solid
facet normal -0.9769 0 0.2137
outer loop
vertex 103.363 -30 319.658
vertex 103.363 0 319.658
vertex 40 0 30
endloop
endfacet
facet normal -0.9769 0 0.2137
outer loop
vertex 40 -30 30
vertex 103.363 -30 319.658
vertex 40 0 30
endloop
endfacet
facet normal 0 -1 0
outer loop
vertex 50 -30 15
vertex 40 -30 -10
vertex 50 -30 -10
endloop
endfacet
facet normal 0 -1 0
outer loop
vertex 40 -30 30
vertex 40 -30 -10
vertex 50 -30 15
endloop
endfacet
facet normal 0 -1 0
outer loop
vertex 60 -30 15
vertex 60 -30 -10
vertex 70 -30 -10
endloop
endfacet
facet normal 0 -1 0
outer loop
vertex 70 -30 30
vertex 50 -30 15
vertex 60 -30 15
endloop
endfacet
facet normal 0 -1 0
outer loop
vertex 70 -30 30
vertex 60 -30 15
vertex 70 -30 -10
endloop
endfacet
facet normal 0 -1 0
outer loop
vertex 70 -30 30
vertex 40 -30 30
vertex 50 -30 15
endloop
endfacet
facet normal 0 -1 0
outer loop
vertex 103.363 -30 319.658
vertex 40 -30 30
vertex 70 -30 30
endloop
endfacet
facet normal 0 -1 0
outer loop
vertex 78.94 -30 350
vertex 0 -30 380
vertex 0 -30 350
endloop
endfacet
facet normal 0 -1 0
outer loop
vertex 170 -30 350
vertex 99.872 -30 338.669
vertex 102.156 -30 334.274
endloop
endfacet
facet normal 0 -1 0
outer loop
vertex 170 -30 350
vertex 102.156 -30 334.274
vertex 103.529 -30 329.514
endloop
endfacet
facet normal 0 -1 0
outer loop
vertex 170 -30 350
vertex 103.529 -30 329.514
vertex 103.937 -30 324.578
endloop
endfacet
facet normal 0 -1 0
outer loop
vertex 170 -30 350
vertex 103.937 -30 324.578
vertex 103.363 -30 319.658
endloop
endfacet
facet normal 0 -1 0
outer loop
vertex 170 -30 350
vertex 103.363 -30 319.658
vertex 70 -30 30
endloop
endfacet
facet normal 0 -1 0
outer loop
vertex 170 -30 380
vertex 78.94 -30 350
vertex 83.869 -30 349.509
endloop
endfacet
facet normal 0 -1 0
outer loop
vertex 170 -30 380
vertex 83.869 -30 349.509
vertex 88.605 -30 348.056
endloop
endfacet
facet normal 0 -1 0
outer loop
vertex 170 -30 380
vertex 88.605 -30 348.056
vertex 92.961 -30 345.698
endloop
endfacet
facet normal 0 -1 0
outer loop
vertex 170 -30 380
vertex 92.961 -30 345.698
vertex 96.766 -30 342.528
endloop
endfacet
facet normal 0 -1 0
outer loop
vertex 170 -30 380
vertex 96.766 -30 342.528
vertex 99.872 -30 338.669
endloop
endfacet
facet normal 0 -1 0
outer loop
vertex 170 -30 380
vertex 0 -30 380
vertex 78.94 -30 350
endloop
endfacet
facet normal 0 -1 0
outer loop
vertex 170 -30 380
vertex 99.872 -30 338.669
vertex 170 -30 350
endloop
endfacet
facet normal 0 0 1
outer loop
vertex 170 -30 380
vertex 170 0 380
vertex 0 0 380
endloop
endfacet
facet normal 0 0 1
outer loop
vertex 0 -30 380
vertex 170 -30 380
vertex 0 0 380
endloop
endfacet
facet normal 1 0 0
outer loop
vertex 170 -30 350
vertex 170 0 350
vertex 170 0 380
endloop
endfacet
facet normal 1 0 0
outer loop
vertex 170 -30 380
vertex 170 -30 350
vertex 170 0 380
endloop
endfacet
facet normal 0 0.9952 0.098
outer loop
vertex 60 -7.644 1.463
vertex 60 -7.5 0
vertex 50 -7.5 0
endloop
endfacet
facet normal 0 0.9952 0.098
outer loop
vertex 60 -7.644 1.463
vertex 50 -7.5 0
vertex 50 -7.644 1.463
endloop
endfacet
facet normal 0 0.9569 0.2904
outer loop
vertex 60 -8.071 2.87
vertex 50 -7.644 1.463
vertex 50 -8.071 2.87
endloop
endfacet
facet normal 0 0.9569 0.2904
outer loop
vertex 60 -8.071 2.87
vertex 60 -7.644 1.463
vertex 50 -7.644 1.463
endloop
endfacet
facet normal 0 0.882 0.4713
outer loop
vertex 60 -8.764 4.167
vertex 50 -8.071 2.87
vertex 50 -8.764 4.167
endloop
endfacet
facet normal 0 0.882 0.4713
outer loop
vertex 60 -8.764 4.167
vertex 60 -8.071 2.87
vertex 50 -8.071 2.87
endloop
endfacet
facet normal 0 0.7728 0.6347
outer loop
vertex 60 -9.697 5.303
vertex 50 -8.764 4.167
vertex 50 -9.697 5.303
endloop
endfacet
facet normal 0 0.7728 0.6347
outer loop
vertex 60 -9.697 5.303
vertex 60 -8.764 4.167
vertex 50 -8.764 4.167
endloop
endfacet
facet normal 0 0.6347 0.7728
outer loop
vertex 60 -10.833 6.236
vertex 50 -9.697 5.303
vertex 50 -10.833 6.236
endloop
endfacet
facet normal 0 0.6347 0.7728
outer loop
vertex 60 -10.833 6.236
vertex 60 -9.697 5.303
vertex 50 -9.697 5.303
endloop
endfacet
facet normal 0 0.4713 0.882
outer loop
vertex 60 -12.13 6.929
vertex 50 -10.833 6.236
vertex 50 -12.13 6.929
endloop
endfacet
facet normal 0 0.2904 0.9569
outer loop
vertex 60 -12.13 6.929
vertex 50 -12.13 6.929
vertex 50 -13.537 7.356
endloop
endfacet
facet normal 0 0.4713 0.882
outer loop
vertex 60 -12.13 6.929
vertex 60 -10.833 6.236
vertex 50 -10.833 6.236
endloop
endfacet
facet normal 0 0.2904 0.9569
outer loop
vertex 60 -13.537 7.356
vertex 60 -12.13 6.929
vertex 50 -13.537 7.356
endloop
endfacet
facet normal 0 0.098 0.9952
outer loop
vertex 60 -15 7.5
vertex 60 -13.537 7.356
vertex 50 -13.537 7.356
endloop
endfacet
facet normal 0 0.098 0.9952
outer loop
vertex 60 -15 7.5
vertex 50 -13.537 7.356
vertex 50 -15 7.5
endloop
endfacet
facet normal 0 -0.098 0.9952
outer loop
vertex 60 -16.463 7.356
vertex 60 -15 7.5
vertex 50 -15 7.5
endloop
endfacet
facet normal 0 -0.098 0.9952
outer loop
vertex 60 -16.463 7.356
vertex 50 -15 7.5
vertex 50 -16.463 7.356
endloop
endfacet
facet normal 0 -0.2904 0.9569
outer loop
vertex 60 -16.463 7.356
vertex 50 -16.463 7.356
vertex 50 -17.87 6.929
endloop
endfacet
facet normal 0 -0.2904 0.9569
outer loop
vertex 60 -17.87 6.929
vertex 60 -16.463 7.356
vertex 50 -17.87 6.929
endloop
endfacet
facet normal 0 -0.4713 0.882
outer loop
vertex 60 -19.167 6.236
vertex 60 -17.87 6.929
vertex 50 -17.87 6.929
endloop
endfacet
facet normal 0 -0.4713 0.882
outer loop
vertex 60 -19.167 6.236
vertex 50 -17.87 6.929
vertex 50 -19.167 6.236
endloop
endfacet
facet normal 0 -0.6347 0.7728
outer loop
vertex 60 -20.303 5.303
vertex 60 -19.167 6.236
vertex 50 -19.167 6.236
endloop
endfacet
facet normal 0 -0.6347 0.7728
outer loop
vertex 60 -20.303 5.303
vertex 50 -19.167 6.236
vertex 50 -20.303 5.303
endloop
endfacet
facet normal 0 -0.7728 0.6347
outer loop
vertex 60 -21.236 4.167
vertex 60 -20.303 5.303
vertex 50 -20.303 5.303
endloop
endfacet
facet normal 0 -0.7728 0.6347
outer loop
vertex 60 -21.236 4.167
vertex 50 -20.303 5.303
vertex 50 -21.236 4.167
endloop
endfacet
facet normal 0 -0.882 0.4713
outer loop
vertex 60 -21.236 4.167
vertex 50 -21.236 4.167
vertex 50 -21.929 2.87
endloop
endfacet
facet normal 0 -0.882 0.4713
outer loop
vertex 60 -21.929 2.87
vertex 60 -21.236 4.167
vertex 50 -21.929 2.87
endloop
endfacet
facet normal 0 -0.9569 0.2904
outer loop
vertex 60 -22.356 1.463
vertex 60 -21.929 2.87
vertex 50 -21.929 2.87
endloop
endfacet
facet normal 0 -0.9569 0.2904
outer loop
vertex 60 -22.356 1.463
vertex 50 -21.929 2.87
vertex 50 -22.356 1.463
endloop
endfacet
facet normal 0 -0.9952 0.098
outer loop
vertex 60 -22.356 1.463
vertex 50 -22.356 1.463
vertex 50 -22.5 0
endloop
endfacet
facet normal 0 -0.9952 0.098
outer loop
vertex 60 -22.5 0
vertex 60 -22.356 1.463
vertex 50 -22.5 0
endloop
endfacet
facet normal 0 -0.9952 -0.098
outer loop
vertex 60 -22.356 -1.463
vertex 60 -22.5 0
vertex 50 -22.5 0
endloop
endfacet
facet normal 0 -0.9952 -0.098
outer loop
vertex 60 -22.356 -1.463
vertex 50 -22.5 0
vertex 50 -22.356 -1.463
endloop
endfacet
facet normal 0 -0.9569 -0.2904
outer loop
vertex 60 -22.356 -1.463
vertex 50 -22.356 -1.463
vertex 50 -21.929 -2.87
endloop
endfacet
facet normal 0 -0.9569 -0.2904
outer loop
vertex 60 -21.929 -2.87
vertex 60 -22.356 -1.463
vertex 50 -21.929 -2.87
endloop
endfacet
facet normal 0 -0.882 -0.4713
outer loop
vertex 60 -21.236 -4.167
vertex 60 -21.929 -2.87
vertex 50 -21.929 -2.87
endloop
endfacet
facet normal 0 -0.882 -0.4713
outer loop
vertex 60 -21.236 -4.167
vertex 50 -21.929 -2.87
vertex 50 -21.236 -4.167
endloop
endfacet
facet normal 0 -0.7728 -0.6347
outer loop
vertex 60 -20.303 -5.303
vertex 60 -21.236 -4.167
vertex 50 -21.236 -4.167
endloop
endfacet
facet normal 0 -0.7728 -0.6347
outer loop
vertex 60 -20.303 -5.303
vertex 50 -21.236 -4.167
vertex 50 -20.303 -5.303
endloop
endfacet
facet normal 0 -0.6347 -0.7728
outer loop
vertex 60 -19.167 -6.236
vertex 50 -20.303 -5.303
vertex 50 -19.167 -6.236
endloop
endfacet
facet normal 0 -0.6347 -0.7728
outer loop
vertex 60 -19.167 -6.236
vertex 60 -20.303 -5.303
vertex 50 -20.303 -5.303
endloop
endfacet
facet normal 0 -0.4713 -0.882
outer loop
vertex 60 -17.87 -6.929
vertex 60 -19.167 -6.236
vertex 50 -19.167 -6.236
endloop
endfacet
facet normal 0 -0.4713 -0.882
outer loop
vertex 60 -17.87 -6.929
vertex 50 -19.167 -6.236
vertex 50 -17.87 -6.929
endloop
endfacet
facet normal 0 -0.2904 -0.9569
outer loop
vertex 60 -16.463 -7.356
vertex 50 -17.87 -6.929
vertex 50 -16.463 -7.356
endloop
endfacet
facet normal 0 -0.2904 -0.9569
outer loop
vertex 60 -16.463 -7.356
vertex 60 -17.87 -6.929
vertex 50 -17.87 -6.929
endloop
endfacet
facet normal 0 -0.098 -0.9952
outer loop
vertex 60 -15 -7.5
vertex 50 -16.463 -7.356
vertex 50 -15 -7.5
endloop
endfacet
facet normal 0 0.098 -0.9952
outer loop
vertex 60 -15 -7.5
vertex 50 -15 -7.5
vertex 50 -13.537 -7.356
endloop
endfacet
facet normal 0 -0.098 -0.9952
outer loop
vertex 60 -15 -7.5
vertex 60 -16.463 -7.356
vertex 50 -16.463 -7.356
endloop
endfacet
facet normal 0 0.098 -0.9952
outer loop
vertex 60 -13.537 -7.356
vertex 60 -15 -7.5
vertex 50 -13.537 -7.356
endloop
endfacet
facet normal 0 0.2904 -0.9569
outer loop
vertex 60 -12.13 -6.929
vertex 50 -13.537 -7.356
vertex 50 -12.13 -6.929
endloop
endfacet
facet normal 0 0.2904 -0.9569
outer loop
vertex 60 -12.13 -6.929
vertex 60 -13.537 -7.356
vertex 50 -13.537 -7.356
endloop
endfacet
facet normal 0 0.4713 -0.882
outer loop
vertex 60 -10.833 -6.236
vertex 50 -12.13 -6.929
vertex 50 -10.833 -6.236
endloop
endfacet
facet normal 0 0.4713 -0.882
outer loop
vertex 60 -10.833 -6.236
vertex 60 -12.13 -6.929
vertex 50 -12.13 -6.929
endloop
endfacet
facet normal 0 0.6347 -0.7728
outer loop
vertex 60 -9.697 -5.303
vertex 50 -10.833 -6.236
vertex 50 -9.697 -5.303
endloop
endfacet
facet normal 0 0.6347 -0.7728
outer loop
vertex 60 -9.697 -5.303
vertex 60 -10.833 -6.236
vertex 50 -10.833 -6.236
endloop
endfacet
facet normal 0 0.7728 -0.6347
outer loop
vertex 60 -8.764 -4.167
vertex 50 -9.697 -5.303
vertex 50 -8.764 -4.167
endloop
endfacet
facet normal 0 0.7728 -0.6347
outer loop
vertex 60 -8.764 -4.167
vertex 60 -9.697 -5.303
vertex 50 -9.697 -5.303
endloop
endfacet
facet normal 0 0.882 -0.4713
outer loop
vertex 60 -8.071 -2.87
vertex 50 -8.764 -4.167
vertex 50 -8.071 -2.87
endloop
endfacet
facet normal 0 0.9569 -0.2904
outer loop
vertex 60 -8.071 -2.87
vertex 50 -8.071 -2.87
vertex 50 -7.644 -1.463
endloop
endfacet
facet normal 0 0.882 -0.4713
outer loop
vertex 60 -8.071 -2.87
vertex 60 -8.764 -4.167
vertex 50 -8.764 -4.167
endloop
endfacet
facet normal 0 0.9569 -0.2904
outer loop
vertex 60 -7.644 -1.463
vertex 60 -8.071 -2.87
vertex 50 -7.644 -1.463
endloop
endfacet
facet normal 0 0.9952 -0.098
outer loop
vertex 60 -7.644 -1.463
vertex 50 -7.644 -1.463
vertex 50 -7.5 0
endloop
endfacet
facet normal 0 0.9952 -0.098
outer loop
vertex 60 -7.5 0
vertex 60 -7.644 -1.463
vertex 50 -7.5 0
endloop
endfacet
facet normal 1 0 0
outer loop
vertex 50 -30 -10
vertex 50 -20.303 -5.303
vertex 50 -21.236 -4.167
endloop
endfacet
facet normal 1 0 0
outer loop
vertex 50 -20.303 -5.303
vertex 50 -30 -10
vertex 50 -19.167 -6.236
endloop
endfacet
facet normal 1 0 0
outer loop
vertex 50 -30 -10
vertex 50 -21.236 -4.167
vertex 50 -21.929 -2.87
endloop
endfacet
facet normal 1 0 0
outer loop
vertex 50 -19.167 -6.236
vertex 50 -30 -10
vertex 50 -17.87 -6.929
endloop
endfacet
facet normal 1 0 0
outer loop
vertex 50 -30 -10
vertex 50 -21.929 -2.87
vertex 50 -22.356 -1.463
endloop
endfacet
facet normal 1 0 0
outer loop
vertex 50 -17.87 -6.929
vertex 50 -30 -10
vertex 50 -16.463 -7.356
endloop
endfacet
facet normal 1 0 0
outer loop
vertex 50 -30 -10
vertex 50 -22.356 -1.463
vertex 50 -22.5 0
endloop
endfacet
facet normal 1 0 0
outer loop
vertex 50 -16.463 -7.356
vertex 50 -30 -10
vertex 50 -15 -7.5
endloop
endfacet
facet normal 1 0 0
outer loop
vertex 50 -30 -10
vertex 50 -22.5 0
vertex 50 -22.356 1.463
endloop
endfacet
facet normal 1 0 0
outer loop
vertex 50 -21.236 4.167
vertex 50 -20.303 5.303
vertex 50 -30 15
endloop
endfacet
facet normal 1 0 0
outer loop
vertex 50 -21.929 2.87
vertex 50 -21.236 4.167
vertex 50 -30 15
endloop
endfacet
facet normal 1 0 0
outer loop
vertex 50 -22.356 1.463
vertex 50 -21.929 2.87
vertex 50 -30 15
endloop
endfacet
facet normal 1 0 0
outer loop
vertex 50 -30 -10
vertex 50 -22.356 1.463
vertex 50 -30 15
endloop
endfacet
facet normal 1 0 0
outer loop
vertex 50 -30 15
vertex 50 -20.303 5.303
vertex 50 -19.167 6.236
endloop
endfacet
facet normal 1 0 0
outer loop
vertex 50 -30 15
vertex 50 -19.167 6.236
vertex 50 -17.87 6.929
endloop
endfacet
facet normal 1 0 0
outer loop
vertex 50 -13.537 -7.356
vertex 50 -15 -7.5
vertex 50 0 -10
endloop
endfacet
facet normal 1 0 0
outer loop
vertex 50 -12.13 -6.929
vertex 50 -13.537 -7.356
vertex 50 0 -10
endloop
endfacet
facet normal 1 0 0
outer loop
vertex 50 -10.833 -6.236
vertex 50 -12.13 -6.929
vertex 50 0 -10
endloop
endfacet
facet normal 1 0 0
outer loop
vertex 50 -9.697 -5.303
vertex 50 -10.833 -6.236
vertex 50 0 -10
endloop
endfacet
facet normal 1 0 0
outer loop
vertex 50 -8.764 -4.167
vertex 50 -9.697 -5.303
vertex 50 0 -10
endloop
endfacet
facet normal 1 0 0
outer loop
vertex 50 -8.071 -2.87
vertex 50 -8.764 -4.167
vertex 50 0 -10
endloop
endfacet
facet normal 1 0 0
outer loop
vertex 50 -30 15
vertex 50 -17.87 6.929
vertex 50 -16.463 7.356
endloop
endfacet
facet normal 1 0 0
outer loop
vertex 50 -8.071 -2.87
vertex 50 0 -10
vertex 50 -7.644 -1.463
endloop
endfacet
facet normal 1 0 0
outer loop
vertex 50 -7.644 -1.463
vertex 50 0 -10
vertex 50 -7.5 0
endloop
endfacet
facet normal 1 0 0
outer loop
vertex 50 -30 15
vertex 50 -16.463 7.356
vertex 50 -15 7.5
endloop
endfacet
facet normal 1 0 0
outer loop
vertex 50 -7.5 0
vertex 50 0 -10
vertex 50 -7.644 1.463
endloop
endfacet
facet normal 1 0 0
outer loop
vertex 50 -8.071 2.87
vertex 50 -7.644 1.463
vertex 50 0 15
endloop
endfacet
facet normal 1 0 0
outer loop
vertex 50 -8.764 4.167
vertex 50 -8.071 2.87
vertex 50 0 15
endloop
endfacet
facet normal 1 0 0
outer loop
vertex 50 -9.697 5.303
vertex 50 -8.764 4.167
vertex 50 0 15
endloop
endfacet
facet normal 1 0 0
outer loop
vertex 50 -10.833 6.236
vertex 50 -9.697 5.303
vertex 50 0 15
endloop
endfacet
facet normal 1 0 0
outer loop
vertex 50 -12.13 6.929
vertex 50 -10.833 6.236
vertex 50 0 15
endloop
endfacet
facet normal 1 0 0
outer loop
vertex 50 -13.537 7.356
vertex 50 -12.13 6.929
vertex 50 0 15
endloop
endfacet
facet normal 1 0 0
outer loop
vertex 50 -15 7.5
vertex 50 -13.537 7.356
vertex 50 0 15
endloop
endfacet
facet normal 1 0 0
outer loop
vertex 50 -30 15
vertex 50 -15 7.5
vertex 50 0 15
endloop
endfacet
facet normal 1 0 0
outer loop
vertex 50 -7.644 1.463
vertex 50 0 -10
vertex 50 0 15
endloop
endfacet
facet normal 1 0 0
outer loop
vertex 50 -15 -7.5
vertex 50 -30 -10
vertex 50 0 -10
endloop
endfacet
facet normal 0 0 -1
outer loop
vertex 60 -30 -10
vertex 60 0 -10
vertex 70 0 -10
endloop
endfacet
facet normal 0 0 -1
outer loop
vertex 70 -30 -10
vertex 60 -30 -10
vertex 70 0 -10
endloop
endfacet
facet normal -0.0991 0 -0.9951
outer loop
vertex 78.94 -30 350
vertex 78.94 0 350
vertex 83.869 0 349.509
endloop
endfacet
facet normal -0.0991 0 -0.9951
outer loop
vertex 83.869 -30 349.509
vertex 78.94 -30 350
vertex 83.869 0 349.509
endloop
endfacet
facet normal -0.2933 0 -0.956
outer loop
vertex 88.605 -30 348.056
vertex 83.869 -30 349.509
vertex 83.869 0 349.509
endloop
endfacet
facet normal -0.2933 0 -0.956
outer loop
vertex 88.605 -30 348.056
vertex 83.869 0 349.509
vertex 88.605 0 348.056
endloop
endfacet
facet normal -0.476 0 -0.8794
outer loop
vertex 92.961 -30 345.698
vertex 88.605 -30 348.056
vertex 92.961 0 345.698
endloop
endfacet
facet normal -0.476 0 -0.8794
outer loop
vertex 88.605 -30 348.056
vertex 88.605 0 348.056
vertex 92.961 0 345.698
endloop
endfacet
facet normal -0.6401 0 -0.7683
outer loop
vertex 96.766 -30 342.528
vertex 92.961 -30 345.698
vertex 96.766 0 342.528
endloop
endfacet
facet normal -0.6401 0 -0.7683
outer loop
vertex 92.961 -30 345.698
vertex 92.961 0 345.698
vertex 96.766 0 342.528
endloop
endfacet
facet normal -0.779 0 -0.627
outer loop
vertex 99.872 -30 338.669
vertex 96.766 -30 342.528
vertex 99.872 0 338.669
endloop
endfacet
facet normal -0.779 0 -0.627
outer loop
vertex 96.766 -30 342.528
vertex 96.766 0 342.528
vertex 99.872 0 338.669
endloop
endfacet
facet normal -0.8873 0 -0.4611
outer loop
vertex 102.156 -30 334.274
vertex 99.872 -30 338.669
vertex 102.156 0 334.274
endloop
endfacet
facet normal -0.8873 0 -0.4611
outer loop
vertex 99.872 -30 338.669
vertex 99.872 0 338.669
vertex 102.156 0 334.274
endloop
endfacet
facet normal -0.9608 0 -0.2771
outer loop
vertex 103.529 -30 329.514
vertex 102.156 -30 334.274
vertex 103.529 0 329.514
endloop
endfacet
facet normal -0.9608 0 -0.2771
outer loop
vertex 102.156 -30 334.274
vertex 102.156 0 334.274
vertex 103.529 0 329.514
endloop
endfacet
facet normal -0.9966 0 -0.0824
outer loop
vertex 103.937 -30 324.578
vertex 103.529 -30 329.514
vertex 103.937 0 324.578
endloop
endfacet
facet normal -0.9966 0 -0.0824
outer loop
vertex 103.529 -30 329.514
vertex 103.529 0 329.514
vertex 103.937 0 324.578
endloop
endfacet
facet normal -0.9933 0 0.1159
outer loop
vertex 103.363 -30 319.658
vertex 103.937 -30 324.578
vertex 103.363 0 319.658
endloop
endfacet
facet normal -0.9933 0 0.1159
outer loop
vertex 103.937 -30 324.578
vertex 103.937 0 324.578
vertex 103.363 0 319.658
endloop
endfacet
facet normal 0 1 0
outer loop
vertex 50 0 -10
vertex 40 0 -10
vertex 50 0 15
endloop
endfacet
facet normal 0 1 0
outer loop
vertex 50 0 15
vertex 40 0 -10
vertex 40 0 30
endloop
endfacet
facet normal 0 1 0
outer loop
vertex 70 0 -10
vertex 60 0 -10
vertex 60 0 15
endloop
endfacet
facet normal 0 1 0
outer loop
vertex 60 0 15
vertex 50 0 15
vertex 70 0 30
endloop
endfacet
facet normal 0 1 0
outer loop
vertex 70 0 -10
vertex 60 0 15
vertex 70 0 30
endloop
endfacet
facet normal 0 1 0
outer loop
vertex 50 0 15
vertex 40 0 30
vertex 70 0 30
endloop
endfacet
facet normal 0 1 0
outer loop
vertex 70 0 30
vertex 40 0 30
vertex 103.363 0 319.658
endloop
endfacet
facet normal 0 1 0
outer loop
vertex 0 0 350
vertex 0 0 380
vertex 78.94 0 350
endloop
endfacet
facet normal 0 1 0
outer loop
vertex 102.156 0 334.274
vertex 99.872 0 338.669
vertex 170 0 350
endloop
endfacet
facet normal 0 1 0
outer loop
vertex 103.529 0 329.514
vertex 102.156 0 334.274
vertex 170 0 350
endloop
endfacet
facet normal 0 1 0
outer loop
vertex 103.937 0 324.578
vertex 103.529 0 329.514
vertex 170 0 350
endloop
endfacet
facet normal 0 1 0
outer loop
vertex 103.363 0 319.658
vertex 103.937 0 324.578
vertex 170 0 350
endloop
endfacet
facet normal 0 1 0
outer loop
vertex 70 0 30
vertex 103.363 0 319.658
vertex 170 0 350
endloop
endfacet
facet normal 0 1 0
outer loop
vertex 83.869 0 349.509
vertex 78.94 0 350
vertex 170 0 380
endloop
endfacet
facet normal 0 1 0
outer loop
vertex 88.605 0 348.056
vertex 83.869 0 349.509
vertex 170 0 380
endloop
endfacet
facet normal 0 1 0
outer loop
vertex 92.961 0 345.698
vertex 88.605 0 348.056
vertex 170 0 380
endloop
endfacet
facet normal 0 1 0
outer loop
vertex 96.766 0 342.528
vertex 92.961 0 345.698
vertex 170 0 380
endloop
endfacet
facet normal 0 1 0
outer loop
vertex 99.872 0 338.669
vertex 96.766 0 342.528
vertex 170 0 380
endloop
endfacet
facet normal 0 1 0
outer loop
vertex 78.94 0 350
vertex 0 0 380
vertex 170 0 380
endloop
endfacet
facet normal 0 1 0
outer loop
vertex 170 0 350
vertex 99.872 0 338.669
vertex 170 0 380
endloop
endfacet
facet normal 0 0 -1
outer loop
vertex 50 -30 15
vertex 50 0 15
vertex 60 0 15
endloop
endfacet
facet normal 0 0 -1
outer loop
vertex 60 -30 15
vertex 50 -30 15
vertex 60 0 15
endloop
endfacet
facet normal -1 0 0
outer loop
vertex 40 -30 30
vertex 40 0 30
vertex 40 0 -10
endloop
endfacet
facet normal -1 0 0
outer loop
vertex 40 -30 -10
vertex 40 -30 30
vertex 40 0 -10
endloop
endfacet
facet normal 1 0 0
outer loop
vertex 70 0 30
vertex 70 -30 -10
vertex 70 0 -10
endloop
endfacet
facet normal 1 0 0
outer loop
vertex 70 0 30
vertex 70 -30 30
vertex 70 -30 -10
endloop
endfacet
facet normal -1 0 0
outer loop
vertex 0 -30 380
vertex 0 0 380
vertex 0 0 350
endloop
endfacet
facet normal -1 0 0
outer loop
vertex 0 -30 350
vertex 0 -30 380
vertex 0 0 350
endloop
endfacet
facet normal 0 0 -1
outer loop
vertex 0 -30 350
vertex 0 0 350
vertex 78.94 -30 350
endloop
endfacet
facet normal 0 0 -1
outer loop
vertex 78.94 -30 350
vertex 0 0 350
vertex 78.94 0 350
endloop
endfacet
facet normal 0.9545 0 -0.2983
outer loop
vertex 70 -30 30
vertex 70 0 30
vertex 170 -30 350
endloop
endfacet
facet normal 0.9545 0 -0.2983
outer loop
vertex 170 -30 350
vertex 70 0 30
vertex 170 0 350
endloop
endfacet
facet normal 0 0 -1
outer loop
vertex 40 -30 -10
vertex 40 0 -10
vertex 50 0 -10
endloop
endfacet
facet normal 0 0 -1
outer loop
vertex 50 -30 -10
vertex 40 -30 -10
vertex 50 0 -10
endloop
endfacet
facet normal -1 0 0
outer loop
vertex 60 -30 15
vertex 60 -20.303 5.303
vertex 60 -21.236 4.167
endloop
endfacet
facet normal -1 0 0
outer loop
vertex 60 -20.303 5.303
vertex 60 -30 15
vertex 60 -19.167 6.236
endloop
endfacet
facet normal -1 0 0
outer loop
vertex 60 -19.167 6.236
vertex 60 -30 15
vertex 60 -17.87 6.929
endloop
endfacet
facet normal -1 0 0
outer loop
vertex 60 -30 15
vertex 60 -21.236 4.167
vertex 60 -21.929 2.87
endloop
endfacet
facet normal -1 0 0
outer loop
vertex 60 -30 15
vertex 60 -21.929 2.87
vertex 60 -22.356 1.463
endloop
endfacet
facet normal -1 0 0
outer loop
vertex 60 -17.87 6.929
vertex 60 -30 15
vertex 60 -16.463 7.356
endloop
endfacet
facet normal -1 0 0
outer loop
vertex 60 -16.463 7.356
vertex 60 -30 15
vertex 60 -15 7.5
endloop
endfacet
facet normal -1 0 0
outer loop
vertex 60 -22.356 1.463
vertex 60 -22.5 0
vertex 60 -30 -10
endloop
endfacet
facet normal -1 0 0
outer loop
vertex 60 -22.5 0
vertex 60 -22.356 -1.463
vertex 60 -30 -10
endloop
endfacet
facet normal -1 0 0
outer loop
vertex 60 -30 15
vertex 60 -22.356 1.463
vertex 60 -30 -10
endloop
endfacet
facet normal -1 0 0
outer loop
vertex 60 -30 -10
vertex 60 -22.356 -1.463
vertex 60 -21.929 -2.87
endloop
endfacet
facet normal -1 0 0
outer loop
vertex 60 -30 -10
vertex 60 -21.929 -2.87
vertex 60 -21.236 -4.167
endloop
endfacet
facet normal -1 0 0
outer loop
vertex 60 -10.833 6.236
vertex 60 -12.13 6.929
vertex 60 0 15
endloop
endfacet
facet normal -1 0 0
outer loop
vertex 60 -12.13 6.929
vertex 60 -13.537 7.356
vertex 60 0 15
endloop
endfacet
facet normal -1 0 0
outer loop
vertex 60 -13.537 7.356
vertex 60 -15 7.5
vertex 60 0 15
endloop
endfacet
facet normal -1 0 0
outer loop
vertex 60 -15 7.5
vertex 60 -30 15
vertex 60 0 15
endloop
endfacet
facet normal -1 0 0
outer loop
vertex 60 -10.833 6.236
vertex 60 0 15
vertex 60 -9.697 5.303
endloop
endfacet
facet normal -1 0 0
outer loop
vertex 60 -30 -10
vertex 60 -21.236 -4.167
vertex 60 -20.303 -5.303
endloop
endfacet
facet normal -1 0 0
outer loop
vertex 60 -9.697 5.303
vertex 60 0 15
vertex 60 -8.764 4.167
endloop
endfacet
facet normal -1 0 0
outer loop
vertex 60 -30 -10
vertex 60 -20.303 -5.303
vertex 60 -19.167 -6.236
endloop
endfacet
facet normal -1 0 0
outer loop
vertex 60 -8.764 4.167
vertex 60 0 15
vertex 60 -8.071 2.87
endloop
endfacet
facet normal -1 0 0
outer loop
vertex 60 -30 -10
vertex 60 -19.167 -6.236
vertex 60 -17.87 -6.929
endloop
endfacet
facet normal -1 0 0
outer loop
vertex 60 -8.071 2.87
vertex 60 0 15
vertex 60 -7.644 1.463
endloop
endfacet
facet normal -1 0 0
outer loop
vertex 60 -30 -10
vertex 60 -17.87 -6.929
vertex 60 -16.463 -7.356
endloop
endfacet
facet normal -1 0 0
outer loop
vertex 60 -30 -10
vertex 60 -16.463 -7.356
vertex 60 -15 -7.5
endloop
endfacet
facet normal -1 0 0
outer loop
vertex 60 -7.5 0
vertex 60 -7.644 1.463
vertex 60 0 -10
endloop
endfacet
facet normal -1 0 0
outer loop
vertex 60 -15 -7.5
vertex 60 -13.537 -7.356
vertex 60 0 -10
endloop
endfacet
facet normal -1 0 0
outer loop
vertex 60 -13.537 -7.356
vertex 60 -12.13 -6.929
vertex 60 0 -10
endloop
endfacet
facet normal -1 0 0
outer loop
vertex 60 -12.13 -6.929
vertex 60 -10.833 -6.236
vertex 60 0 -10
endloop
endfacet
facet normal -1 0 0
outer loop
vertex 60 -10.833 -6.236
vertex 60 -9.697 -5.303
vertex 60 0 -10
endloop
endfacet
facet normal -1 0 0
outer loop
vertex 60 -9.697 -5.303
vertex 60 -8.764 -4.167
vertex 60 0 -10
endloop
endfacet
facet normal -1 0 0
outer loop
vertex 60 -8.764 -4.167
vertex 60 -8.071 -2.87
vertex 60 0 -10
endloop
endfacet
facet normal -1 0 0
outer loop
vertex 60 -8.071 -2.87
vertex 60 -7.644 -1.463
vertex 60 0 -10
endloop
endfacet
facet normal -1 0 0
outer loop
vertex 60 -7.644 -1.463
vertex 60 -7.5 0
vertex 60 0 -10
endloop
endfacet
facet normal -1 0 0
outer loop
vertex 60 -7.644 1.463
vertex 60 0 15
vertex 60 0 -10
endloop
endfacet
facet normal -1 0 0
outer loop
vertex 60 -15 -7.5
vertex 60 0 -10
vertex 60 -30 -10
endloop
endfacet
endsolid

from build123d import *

# Parameters (mm, degrees)
F1_DEPTH = 30
F2_R     = 7.5
F3_DEPTH = 22.9


with BuildPart() as f1:
    # F0 (on Front) → F1 (new body)
    with BuildSketch(Plane.XZ):
        with BuildLine():
            ThreePointArc((78.940095, 350), (98.415214, 340.67545), (103.362595, 319.657578))
            Line((103.362595, 319.657578), (40, 30))
            Line((40, 30), (40, 0))
            Line((40, 0), (40, -10))
            Line((40, -10), (50, -10))
            Line((50, -10), (50, 15))
            Line((50, 15), (60, 15))
            Line((60, 15), (60, -10))
            Line((60, -10), (70, -10))
            Line((70, -10), (70, 0))
            Line((70, 0), (70, 30))
            Line((70, 30), (170, 350))
            Line((170, 350), (170, 380))
            Line((170, 380), (0, 380))
            Line((0, 380), (0, 350))
            Line((0, 350), (78.940095, 350))
        make_face()
    extrude(amount=F1_DEPTH)

    # F2 (on face) → F3 (join)
    with BuildSketch(Plane.YZ.offset(70)):
        with Locations((-15, 0)):
            Circle(F2_R)
    extrude(amount=-F3_DEPTH)


solid = f1.part
